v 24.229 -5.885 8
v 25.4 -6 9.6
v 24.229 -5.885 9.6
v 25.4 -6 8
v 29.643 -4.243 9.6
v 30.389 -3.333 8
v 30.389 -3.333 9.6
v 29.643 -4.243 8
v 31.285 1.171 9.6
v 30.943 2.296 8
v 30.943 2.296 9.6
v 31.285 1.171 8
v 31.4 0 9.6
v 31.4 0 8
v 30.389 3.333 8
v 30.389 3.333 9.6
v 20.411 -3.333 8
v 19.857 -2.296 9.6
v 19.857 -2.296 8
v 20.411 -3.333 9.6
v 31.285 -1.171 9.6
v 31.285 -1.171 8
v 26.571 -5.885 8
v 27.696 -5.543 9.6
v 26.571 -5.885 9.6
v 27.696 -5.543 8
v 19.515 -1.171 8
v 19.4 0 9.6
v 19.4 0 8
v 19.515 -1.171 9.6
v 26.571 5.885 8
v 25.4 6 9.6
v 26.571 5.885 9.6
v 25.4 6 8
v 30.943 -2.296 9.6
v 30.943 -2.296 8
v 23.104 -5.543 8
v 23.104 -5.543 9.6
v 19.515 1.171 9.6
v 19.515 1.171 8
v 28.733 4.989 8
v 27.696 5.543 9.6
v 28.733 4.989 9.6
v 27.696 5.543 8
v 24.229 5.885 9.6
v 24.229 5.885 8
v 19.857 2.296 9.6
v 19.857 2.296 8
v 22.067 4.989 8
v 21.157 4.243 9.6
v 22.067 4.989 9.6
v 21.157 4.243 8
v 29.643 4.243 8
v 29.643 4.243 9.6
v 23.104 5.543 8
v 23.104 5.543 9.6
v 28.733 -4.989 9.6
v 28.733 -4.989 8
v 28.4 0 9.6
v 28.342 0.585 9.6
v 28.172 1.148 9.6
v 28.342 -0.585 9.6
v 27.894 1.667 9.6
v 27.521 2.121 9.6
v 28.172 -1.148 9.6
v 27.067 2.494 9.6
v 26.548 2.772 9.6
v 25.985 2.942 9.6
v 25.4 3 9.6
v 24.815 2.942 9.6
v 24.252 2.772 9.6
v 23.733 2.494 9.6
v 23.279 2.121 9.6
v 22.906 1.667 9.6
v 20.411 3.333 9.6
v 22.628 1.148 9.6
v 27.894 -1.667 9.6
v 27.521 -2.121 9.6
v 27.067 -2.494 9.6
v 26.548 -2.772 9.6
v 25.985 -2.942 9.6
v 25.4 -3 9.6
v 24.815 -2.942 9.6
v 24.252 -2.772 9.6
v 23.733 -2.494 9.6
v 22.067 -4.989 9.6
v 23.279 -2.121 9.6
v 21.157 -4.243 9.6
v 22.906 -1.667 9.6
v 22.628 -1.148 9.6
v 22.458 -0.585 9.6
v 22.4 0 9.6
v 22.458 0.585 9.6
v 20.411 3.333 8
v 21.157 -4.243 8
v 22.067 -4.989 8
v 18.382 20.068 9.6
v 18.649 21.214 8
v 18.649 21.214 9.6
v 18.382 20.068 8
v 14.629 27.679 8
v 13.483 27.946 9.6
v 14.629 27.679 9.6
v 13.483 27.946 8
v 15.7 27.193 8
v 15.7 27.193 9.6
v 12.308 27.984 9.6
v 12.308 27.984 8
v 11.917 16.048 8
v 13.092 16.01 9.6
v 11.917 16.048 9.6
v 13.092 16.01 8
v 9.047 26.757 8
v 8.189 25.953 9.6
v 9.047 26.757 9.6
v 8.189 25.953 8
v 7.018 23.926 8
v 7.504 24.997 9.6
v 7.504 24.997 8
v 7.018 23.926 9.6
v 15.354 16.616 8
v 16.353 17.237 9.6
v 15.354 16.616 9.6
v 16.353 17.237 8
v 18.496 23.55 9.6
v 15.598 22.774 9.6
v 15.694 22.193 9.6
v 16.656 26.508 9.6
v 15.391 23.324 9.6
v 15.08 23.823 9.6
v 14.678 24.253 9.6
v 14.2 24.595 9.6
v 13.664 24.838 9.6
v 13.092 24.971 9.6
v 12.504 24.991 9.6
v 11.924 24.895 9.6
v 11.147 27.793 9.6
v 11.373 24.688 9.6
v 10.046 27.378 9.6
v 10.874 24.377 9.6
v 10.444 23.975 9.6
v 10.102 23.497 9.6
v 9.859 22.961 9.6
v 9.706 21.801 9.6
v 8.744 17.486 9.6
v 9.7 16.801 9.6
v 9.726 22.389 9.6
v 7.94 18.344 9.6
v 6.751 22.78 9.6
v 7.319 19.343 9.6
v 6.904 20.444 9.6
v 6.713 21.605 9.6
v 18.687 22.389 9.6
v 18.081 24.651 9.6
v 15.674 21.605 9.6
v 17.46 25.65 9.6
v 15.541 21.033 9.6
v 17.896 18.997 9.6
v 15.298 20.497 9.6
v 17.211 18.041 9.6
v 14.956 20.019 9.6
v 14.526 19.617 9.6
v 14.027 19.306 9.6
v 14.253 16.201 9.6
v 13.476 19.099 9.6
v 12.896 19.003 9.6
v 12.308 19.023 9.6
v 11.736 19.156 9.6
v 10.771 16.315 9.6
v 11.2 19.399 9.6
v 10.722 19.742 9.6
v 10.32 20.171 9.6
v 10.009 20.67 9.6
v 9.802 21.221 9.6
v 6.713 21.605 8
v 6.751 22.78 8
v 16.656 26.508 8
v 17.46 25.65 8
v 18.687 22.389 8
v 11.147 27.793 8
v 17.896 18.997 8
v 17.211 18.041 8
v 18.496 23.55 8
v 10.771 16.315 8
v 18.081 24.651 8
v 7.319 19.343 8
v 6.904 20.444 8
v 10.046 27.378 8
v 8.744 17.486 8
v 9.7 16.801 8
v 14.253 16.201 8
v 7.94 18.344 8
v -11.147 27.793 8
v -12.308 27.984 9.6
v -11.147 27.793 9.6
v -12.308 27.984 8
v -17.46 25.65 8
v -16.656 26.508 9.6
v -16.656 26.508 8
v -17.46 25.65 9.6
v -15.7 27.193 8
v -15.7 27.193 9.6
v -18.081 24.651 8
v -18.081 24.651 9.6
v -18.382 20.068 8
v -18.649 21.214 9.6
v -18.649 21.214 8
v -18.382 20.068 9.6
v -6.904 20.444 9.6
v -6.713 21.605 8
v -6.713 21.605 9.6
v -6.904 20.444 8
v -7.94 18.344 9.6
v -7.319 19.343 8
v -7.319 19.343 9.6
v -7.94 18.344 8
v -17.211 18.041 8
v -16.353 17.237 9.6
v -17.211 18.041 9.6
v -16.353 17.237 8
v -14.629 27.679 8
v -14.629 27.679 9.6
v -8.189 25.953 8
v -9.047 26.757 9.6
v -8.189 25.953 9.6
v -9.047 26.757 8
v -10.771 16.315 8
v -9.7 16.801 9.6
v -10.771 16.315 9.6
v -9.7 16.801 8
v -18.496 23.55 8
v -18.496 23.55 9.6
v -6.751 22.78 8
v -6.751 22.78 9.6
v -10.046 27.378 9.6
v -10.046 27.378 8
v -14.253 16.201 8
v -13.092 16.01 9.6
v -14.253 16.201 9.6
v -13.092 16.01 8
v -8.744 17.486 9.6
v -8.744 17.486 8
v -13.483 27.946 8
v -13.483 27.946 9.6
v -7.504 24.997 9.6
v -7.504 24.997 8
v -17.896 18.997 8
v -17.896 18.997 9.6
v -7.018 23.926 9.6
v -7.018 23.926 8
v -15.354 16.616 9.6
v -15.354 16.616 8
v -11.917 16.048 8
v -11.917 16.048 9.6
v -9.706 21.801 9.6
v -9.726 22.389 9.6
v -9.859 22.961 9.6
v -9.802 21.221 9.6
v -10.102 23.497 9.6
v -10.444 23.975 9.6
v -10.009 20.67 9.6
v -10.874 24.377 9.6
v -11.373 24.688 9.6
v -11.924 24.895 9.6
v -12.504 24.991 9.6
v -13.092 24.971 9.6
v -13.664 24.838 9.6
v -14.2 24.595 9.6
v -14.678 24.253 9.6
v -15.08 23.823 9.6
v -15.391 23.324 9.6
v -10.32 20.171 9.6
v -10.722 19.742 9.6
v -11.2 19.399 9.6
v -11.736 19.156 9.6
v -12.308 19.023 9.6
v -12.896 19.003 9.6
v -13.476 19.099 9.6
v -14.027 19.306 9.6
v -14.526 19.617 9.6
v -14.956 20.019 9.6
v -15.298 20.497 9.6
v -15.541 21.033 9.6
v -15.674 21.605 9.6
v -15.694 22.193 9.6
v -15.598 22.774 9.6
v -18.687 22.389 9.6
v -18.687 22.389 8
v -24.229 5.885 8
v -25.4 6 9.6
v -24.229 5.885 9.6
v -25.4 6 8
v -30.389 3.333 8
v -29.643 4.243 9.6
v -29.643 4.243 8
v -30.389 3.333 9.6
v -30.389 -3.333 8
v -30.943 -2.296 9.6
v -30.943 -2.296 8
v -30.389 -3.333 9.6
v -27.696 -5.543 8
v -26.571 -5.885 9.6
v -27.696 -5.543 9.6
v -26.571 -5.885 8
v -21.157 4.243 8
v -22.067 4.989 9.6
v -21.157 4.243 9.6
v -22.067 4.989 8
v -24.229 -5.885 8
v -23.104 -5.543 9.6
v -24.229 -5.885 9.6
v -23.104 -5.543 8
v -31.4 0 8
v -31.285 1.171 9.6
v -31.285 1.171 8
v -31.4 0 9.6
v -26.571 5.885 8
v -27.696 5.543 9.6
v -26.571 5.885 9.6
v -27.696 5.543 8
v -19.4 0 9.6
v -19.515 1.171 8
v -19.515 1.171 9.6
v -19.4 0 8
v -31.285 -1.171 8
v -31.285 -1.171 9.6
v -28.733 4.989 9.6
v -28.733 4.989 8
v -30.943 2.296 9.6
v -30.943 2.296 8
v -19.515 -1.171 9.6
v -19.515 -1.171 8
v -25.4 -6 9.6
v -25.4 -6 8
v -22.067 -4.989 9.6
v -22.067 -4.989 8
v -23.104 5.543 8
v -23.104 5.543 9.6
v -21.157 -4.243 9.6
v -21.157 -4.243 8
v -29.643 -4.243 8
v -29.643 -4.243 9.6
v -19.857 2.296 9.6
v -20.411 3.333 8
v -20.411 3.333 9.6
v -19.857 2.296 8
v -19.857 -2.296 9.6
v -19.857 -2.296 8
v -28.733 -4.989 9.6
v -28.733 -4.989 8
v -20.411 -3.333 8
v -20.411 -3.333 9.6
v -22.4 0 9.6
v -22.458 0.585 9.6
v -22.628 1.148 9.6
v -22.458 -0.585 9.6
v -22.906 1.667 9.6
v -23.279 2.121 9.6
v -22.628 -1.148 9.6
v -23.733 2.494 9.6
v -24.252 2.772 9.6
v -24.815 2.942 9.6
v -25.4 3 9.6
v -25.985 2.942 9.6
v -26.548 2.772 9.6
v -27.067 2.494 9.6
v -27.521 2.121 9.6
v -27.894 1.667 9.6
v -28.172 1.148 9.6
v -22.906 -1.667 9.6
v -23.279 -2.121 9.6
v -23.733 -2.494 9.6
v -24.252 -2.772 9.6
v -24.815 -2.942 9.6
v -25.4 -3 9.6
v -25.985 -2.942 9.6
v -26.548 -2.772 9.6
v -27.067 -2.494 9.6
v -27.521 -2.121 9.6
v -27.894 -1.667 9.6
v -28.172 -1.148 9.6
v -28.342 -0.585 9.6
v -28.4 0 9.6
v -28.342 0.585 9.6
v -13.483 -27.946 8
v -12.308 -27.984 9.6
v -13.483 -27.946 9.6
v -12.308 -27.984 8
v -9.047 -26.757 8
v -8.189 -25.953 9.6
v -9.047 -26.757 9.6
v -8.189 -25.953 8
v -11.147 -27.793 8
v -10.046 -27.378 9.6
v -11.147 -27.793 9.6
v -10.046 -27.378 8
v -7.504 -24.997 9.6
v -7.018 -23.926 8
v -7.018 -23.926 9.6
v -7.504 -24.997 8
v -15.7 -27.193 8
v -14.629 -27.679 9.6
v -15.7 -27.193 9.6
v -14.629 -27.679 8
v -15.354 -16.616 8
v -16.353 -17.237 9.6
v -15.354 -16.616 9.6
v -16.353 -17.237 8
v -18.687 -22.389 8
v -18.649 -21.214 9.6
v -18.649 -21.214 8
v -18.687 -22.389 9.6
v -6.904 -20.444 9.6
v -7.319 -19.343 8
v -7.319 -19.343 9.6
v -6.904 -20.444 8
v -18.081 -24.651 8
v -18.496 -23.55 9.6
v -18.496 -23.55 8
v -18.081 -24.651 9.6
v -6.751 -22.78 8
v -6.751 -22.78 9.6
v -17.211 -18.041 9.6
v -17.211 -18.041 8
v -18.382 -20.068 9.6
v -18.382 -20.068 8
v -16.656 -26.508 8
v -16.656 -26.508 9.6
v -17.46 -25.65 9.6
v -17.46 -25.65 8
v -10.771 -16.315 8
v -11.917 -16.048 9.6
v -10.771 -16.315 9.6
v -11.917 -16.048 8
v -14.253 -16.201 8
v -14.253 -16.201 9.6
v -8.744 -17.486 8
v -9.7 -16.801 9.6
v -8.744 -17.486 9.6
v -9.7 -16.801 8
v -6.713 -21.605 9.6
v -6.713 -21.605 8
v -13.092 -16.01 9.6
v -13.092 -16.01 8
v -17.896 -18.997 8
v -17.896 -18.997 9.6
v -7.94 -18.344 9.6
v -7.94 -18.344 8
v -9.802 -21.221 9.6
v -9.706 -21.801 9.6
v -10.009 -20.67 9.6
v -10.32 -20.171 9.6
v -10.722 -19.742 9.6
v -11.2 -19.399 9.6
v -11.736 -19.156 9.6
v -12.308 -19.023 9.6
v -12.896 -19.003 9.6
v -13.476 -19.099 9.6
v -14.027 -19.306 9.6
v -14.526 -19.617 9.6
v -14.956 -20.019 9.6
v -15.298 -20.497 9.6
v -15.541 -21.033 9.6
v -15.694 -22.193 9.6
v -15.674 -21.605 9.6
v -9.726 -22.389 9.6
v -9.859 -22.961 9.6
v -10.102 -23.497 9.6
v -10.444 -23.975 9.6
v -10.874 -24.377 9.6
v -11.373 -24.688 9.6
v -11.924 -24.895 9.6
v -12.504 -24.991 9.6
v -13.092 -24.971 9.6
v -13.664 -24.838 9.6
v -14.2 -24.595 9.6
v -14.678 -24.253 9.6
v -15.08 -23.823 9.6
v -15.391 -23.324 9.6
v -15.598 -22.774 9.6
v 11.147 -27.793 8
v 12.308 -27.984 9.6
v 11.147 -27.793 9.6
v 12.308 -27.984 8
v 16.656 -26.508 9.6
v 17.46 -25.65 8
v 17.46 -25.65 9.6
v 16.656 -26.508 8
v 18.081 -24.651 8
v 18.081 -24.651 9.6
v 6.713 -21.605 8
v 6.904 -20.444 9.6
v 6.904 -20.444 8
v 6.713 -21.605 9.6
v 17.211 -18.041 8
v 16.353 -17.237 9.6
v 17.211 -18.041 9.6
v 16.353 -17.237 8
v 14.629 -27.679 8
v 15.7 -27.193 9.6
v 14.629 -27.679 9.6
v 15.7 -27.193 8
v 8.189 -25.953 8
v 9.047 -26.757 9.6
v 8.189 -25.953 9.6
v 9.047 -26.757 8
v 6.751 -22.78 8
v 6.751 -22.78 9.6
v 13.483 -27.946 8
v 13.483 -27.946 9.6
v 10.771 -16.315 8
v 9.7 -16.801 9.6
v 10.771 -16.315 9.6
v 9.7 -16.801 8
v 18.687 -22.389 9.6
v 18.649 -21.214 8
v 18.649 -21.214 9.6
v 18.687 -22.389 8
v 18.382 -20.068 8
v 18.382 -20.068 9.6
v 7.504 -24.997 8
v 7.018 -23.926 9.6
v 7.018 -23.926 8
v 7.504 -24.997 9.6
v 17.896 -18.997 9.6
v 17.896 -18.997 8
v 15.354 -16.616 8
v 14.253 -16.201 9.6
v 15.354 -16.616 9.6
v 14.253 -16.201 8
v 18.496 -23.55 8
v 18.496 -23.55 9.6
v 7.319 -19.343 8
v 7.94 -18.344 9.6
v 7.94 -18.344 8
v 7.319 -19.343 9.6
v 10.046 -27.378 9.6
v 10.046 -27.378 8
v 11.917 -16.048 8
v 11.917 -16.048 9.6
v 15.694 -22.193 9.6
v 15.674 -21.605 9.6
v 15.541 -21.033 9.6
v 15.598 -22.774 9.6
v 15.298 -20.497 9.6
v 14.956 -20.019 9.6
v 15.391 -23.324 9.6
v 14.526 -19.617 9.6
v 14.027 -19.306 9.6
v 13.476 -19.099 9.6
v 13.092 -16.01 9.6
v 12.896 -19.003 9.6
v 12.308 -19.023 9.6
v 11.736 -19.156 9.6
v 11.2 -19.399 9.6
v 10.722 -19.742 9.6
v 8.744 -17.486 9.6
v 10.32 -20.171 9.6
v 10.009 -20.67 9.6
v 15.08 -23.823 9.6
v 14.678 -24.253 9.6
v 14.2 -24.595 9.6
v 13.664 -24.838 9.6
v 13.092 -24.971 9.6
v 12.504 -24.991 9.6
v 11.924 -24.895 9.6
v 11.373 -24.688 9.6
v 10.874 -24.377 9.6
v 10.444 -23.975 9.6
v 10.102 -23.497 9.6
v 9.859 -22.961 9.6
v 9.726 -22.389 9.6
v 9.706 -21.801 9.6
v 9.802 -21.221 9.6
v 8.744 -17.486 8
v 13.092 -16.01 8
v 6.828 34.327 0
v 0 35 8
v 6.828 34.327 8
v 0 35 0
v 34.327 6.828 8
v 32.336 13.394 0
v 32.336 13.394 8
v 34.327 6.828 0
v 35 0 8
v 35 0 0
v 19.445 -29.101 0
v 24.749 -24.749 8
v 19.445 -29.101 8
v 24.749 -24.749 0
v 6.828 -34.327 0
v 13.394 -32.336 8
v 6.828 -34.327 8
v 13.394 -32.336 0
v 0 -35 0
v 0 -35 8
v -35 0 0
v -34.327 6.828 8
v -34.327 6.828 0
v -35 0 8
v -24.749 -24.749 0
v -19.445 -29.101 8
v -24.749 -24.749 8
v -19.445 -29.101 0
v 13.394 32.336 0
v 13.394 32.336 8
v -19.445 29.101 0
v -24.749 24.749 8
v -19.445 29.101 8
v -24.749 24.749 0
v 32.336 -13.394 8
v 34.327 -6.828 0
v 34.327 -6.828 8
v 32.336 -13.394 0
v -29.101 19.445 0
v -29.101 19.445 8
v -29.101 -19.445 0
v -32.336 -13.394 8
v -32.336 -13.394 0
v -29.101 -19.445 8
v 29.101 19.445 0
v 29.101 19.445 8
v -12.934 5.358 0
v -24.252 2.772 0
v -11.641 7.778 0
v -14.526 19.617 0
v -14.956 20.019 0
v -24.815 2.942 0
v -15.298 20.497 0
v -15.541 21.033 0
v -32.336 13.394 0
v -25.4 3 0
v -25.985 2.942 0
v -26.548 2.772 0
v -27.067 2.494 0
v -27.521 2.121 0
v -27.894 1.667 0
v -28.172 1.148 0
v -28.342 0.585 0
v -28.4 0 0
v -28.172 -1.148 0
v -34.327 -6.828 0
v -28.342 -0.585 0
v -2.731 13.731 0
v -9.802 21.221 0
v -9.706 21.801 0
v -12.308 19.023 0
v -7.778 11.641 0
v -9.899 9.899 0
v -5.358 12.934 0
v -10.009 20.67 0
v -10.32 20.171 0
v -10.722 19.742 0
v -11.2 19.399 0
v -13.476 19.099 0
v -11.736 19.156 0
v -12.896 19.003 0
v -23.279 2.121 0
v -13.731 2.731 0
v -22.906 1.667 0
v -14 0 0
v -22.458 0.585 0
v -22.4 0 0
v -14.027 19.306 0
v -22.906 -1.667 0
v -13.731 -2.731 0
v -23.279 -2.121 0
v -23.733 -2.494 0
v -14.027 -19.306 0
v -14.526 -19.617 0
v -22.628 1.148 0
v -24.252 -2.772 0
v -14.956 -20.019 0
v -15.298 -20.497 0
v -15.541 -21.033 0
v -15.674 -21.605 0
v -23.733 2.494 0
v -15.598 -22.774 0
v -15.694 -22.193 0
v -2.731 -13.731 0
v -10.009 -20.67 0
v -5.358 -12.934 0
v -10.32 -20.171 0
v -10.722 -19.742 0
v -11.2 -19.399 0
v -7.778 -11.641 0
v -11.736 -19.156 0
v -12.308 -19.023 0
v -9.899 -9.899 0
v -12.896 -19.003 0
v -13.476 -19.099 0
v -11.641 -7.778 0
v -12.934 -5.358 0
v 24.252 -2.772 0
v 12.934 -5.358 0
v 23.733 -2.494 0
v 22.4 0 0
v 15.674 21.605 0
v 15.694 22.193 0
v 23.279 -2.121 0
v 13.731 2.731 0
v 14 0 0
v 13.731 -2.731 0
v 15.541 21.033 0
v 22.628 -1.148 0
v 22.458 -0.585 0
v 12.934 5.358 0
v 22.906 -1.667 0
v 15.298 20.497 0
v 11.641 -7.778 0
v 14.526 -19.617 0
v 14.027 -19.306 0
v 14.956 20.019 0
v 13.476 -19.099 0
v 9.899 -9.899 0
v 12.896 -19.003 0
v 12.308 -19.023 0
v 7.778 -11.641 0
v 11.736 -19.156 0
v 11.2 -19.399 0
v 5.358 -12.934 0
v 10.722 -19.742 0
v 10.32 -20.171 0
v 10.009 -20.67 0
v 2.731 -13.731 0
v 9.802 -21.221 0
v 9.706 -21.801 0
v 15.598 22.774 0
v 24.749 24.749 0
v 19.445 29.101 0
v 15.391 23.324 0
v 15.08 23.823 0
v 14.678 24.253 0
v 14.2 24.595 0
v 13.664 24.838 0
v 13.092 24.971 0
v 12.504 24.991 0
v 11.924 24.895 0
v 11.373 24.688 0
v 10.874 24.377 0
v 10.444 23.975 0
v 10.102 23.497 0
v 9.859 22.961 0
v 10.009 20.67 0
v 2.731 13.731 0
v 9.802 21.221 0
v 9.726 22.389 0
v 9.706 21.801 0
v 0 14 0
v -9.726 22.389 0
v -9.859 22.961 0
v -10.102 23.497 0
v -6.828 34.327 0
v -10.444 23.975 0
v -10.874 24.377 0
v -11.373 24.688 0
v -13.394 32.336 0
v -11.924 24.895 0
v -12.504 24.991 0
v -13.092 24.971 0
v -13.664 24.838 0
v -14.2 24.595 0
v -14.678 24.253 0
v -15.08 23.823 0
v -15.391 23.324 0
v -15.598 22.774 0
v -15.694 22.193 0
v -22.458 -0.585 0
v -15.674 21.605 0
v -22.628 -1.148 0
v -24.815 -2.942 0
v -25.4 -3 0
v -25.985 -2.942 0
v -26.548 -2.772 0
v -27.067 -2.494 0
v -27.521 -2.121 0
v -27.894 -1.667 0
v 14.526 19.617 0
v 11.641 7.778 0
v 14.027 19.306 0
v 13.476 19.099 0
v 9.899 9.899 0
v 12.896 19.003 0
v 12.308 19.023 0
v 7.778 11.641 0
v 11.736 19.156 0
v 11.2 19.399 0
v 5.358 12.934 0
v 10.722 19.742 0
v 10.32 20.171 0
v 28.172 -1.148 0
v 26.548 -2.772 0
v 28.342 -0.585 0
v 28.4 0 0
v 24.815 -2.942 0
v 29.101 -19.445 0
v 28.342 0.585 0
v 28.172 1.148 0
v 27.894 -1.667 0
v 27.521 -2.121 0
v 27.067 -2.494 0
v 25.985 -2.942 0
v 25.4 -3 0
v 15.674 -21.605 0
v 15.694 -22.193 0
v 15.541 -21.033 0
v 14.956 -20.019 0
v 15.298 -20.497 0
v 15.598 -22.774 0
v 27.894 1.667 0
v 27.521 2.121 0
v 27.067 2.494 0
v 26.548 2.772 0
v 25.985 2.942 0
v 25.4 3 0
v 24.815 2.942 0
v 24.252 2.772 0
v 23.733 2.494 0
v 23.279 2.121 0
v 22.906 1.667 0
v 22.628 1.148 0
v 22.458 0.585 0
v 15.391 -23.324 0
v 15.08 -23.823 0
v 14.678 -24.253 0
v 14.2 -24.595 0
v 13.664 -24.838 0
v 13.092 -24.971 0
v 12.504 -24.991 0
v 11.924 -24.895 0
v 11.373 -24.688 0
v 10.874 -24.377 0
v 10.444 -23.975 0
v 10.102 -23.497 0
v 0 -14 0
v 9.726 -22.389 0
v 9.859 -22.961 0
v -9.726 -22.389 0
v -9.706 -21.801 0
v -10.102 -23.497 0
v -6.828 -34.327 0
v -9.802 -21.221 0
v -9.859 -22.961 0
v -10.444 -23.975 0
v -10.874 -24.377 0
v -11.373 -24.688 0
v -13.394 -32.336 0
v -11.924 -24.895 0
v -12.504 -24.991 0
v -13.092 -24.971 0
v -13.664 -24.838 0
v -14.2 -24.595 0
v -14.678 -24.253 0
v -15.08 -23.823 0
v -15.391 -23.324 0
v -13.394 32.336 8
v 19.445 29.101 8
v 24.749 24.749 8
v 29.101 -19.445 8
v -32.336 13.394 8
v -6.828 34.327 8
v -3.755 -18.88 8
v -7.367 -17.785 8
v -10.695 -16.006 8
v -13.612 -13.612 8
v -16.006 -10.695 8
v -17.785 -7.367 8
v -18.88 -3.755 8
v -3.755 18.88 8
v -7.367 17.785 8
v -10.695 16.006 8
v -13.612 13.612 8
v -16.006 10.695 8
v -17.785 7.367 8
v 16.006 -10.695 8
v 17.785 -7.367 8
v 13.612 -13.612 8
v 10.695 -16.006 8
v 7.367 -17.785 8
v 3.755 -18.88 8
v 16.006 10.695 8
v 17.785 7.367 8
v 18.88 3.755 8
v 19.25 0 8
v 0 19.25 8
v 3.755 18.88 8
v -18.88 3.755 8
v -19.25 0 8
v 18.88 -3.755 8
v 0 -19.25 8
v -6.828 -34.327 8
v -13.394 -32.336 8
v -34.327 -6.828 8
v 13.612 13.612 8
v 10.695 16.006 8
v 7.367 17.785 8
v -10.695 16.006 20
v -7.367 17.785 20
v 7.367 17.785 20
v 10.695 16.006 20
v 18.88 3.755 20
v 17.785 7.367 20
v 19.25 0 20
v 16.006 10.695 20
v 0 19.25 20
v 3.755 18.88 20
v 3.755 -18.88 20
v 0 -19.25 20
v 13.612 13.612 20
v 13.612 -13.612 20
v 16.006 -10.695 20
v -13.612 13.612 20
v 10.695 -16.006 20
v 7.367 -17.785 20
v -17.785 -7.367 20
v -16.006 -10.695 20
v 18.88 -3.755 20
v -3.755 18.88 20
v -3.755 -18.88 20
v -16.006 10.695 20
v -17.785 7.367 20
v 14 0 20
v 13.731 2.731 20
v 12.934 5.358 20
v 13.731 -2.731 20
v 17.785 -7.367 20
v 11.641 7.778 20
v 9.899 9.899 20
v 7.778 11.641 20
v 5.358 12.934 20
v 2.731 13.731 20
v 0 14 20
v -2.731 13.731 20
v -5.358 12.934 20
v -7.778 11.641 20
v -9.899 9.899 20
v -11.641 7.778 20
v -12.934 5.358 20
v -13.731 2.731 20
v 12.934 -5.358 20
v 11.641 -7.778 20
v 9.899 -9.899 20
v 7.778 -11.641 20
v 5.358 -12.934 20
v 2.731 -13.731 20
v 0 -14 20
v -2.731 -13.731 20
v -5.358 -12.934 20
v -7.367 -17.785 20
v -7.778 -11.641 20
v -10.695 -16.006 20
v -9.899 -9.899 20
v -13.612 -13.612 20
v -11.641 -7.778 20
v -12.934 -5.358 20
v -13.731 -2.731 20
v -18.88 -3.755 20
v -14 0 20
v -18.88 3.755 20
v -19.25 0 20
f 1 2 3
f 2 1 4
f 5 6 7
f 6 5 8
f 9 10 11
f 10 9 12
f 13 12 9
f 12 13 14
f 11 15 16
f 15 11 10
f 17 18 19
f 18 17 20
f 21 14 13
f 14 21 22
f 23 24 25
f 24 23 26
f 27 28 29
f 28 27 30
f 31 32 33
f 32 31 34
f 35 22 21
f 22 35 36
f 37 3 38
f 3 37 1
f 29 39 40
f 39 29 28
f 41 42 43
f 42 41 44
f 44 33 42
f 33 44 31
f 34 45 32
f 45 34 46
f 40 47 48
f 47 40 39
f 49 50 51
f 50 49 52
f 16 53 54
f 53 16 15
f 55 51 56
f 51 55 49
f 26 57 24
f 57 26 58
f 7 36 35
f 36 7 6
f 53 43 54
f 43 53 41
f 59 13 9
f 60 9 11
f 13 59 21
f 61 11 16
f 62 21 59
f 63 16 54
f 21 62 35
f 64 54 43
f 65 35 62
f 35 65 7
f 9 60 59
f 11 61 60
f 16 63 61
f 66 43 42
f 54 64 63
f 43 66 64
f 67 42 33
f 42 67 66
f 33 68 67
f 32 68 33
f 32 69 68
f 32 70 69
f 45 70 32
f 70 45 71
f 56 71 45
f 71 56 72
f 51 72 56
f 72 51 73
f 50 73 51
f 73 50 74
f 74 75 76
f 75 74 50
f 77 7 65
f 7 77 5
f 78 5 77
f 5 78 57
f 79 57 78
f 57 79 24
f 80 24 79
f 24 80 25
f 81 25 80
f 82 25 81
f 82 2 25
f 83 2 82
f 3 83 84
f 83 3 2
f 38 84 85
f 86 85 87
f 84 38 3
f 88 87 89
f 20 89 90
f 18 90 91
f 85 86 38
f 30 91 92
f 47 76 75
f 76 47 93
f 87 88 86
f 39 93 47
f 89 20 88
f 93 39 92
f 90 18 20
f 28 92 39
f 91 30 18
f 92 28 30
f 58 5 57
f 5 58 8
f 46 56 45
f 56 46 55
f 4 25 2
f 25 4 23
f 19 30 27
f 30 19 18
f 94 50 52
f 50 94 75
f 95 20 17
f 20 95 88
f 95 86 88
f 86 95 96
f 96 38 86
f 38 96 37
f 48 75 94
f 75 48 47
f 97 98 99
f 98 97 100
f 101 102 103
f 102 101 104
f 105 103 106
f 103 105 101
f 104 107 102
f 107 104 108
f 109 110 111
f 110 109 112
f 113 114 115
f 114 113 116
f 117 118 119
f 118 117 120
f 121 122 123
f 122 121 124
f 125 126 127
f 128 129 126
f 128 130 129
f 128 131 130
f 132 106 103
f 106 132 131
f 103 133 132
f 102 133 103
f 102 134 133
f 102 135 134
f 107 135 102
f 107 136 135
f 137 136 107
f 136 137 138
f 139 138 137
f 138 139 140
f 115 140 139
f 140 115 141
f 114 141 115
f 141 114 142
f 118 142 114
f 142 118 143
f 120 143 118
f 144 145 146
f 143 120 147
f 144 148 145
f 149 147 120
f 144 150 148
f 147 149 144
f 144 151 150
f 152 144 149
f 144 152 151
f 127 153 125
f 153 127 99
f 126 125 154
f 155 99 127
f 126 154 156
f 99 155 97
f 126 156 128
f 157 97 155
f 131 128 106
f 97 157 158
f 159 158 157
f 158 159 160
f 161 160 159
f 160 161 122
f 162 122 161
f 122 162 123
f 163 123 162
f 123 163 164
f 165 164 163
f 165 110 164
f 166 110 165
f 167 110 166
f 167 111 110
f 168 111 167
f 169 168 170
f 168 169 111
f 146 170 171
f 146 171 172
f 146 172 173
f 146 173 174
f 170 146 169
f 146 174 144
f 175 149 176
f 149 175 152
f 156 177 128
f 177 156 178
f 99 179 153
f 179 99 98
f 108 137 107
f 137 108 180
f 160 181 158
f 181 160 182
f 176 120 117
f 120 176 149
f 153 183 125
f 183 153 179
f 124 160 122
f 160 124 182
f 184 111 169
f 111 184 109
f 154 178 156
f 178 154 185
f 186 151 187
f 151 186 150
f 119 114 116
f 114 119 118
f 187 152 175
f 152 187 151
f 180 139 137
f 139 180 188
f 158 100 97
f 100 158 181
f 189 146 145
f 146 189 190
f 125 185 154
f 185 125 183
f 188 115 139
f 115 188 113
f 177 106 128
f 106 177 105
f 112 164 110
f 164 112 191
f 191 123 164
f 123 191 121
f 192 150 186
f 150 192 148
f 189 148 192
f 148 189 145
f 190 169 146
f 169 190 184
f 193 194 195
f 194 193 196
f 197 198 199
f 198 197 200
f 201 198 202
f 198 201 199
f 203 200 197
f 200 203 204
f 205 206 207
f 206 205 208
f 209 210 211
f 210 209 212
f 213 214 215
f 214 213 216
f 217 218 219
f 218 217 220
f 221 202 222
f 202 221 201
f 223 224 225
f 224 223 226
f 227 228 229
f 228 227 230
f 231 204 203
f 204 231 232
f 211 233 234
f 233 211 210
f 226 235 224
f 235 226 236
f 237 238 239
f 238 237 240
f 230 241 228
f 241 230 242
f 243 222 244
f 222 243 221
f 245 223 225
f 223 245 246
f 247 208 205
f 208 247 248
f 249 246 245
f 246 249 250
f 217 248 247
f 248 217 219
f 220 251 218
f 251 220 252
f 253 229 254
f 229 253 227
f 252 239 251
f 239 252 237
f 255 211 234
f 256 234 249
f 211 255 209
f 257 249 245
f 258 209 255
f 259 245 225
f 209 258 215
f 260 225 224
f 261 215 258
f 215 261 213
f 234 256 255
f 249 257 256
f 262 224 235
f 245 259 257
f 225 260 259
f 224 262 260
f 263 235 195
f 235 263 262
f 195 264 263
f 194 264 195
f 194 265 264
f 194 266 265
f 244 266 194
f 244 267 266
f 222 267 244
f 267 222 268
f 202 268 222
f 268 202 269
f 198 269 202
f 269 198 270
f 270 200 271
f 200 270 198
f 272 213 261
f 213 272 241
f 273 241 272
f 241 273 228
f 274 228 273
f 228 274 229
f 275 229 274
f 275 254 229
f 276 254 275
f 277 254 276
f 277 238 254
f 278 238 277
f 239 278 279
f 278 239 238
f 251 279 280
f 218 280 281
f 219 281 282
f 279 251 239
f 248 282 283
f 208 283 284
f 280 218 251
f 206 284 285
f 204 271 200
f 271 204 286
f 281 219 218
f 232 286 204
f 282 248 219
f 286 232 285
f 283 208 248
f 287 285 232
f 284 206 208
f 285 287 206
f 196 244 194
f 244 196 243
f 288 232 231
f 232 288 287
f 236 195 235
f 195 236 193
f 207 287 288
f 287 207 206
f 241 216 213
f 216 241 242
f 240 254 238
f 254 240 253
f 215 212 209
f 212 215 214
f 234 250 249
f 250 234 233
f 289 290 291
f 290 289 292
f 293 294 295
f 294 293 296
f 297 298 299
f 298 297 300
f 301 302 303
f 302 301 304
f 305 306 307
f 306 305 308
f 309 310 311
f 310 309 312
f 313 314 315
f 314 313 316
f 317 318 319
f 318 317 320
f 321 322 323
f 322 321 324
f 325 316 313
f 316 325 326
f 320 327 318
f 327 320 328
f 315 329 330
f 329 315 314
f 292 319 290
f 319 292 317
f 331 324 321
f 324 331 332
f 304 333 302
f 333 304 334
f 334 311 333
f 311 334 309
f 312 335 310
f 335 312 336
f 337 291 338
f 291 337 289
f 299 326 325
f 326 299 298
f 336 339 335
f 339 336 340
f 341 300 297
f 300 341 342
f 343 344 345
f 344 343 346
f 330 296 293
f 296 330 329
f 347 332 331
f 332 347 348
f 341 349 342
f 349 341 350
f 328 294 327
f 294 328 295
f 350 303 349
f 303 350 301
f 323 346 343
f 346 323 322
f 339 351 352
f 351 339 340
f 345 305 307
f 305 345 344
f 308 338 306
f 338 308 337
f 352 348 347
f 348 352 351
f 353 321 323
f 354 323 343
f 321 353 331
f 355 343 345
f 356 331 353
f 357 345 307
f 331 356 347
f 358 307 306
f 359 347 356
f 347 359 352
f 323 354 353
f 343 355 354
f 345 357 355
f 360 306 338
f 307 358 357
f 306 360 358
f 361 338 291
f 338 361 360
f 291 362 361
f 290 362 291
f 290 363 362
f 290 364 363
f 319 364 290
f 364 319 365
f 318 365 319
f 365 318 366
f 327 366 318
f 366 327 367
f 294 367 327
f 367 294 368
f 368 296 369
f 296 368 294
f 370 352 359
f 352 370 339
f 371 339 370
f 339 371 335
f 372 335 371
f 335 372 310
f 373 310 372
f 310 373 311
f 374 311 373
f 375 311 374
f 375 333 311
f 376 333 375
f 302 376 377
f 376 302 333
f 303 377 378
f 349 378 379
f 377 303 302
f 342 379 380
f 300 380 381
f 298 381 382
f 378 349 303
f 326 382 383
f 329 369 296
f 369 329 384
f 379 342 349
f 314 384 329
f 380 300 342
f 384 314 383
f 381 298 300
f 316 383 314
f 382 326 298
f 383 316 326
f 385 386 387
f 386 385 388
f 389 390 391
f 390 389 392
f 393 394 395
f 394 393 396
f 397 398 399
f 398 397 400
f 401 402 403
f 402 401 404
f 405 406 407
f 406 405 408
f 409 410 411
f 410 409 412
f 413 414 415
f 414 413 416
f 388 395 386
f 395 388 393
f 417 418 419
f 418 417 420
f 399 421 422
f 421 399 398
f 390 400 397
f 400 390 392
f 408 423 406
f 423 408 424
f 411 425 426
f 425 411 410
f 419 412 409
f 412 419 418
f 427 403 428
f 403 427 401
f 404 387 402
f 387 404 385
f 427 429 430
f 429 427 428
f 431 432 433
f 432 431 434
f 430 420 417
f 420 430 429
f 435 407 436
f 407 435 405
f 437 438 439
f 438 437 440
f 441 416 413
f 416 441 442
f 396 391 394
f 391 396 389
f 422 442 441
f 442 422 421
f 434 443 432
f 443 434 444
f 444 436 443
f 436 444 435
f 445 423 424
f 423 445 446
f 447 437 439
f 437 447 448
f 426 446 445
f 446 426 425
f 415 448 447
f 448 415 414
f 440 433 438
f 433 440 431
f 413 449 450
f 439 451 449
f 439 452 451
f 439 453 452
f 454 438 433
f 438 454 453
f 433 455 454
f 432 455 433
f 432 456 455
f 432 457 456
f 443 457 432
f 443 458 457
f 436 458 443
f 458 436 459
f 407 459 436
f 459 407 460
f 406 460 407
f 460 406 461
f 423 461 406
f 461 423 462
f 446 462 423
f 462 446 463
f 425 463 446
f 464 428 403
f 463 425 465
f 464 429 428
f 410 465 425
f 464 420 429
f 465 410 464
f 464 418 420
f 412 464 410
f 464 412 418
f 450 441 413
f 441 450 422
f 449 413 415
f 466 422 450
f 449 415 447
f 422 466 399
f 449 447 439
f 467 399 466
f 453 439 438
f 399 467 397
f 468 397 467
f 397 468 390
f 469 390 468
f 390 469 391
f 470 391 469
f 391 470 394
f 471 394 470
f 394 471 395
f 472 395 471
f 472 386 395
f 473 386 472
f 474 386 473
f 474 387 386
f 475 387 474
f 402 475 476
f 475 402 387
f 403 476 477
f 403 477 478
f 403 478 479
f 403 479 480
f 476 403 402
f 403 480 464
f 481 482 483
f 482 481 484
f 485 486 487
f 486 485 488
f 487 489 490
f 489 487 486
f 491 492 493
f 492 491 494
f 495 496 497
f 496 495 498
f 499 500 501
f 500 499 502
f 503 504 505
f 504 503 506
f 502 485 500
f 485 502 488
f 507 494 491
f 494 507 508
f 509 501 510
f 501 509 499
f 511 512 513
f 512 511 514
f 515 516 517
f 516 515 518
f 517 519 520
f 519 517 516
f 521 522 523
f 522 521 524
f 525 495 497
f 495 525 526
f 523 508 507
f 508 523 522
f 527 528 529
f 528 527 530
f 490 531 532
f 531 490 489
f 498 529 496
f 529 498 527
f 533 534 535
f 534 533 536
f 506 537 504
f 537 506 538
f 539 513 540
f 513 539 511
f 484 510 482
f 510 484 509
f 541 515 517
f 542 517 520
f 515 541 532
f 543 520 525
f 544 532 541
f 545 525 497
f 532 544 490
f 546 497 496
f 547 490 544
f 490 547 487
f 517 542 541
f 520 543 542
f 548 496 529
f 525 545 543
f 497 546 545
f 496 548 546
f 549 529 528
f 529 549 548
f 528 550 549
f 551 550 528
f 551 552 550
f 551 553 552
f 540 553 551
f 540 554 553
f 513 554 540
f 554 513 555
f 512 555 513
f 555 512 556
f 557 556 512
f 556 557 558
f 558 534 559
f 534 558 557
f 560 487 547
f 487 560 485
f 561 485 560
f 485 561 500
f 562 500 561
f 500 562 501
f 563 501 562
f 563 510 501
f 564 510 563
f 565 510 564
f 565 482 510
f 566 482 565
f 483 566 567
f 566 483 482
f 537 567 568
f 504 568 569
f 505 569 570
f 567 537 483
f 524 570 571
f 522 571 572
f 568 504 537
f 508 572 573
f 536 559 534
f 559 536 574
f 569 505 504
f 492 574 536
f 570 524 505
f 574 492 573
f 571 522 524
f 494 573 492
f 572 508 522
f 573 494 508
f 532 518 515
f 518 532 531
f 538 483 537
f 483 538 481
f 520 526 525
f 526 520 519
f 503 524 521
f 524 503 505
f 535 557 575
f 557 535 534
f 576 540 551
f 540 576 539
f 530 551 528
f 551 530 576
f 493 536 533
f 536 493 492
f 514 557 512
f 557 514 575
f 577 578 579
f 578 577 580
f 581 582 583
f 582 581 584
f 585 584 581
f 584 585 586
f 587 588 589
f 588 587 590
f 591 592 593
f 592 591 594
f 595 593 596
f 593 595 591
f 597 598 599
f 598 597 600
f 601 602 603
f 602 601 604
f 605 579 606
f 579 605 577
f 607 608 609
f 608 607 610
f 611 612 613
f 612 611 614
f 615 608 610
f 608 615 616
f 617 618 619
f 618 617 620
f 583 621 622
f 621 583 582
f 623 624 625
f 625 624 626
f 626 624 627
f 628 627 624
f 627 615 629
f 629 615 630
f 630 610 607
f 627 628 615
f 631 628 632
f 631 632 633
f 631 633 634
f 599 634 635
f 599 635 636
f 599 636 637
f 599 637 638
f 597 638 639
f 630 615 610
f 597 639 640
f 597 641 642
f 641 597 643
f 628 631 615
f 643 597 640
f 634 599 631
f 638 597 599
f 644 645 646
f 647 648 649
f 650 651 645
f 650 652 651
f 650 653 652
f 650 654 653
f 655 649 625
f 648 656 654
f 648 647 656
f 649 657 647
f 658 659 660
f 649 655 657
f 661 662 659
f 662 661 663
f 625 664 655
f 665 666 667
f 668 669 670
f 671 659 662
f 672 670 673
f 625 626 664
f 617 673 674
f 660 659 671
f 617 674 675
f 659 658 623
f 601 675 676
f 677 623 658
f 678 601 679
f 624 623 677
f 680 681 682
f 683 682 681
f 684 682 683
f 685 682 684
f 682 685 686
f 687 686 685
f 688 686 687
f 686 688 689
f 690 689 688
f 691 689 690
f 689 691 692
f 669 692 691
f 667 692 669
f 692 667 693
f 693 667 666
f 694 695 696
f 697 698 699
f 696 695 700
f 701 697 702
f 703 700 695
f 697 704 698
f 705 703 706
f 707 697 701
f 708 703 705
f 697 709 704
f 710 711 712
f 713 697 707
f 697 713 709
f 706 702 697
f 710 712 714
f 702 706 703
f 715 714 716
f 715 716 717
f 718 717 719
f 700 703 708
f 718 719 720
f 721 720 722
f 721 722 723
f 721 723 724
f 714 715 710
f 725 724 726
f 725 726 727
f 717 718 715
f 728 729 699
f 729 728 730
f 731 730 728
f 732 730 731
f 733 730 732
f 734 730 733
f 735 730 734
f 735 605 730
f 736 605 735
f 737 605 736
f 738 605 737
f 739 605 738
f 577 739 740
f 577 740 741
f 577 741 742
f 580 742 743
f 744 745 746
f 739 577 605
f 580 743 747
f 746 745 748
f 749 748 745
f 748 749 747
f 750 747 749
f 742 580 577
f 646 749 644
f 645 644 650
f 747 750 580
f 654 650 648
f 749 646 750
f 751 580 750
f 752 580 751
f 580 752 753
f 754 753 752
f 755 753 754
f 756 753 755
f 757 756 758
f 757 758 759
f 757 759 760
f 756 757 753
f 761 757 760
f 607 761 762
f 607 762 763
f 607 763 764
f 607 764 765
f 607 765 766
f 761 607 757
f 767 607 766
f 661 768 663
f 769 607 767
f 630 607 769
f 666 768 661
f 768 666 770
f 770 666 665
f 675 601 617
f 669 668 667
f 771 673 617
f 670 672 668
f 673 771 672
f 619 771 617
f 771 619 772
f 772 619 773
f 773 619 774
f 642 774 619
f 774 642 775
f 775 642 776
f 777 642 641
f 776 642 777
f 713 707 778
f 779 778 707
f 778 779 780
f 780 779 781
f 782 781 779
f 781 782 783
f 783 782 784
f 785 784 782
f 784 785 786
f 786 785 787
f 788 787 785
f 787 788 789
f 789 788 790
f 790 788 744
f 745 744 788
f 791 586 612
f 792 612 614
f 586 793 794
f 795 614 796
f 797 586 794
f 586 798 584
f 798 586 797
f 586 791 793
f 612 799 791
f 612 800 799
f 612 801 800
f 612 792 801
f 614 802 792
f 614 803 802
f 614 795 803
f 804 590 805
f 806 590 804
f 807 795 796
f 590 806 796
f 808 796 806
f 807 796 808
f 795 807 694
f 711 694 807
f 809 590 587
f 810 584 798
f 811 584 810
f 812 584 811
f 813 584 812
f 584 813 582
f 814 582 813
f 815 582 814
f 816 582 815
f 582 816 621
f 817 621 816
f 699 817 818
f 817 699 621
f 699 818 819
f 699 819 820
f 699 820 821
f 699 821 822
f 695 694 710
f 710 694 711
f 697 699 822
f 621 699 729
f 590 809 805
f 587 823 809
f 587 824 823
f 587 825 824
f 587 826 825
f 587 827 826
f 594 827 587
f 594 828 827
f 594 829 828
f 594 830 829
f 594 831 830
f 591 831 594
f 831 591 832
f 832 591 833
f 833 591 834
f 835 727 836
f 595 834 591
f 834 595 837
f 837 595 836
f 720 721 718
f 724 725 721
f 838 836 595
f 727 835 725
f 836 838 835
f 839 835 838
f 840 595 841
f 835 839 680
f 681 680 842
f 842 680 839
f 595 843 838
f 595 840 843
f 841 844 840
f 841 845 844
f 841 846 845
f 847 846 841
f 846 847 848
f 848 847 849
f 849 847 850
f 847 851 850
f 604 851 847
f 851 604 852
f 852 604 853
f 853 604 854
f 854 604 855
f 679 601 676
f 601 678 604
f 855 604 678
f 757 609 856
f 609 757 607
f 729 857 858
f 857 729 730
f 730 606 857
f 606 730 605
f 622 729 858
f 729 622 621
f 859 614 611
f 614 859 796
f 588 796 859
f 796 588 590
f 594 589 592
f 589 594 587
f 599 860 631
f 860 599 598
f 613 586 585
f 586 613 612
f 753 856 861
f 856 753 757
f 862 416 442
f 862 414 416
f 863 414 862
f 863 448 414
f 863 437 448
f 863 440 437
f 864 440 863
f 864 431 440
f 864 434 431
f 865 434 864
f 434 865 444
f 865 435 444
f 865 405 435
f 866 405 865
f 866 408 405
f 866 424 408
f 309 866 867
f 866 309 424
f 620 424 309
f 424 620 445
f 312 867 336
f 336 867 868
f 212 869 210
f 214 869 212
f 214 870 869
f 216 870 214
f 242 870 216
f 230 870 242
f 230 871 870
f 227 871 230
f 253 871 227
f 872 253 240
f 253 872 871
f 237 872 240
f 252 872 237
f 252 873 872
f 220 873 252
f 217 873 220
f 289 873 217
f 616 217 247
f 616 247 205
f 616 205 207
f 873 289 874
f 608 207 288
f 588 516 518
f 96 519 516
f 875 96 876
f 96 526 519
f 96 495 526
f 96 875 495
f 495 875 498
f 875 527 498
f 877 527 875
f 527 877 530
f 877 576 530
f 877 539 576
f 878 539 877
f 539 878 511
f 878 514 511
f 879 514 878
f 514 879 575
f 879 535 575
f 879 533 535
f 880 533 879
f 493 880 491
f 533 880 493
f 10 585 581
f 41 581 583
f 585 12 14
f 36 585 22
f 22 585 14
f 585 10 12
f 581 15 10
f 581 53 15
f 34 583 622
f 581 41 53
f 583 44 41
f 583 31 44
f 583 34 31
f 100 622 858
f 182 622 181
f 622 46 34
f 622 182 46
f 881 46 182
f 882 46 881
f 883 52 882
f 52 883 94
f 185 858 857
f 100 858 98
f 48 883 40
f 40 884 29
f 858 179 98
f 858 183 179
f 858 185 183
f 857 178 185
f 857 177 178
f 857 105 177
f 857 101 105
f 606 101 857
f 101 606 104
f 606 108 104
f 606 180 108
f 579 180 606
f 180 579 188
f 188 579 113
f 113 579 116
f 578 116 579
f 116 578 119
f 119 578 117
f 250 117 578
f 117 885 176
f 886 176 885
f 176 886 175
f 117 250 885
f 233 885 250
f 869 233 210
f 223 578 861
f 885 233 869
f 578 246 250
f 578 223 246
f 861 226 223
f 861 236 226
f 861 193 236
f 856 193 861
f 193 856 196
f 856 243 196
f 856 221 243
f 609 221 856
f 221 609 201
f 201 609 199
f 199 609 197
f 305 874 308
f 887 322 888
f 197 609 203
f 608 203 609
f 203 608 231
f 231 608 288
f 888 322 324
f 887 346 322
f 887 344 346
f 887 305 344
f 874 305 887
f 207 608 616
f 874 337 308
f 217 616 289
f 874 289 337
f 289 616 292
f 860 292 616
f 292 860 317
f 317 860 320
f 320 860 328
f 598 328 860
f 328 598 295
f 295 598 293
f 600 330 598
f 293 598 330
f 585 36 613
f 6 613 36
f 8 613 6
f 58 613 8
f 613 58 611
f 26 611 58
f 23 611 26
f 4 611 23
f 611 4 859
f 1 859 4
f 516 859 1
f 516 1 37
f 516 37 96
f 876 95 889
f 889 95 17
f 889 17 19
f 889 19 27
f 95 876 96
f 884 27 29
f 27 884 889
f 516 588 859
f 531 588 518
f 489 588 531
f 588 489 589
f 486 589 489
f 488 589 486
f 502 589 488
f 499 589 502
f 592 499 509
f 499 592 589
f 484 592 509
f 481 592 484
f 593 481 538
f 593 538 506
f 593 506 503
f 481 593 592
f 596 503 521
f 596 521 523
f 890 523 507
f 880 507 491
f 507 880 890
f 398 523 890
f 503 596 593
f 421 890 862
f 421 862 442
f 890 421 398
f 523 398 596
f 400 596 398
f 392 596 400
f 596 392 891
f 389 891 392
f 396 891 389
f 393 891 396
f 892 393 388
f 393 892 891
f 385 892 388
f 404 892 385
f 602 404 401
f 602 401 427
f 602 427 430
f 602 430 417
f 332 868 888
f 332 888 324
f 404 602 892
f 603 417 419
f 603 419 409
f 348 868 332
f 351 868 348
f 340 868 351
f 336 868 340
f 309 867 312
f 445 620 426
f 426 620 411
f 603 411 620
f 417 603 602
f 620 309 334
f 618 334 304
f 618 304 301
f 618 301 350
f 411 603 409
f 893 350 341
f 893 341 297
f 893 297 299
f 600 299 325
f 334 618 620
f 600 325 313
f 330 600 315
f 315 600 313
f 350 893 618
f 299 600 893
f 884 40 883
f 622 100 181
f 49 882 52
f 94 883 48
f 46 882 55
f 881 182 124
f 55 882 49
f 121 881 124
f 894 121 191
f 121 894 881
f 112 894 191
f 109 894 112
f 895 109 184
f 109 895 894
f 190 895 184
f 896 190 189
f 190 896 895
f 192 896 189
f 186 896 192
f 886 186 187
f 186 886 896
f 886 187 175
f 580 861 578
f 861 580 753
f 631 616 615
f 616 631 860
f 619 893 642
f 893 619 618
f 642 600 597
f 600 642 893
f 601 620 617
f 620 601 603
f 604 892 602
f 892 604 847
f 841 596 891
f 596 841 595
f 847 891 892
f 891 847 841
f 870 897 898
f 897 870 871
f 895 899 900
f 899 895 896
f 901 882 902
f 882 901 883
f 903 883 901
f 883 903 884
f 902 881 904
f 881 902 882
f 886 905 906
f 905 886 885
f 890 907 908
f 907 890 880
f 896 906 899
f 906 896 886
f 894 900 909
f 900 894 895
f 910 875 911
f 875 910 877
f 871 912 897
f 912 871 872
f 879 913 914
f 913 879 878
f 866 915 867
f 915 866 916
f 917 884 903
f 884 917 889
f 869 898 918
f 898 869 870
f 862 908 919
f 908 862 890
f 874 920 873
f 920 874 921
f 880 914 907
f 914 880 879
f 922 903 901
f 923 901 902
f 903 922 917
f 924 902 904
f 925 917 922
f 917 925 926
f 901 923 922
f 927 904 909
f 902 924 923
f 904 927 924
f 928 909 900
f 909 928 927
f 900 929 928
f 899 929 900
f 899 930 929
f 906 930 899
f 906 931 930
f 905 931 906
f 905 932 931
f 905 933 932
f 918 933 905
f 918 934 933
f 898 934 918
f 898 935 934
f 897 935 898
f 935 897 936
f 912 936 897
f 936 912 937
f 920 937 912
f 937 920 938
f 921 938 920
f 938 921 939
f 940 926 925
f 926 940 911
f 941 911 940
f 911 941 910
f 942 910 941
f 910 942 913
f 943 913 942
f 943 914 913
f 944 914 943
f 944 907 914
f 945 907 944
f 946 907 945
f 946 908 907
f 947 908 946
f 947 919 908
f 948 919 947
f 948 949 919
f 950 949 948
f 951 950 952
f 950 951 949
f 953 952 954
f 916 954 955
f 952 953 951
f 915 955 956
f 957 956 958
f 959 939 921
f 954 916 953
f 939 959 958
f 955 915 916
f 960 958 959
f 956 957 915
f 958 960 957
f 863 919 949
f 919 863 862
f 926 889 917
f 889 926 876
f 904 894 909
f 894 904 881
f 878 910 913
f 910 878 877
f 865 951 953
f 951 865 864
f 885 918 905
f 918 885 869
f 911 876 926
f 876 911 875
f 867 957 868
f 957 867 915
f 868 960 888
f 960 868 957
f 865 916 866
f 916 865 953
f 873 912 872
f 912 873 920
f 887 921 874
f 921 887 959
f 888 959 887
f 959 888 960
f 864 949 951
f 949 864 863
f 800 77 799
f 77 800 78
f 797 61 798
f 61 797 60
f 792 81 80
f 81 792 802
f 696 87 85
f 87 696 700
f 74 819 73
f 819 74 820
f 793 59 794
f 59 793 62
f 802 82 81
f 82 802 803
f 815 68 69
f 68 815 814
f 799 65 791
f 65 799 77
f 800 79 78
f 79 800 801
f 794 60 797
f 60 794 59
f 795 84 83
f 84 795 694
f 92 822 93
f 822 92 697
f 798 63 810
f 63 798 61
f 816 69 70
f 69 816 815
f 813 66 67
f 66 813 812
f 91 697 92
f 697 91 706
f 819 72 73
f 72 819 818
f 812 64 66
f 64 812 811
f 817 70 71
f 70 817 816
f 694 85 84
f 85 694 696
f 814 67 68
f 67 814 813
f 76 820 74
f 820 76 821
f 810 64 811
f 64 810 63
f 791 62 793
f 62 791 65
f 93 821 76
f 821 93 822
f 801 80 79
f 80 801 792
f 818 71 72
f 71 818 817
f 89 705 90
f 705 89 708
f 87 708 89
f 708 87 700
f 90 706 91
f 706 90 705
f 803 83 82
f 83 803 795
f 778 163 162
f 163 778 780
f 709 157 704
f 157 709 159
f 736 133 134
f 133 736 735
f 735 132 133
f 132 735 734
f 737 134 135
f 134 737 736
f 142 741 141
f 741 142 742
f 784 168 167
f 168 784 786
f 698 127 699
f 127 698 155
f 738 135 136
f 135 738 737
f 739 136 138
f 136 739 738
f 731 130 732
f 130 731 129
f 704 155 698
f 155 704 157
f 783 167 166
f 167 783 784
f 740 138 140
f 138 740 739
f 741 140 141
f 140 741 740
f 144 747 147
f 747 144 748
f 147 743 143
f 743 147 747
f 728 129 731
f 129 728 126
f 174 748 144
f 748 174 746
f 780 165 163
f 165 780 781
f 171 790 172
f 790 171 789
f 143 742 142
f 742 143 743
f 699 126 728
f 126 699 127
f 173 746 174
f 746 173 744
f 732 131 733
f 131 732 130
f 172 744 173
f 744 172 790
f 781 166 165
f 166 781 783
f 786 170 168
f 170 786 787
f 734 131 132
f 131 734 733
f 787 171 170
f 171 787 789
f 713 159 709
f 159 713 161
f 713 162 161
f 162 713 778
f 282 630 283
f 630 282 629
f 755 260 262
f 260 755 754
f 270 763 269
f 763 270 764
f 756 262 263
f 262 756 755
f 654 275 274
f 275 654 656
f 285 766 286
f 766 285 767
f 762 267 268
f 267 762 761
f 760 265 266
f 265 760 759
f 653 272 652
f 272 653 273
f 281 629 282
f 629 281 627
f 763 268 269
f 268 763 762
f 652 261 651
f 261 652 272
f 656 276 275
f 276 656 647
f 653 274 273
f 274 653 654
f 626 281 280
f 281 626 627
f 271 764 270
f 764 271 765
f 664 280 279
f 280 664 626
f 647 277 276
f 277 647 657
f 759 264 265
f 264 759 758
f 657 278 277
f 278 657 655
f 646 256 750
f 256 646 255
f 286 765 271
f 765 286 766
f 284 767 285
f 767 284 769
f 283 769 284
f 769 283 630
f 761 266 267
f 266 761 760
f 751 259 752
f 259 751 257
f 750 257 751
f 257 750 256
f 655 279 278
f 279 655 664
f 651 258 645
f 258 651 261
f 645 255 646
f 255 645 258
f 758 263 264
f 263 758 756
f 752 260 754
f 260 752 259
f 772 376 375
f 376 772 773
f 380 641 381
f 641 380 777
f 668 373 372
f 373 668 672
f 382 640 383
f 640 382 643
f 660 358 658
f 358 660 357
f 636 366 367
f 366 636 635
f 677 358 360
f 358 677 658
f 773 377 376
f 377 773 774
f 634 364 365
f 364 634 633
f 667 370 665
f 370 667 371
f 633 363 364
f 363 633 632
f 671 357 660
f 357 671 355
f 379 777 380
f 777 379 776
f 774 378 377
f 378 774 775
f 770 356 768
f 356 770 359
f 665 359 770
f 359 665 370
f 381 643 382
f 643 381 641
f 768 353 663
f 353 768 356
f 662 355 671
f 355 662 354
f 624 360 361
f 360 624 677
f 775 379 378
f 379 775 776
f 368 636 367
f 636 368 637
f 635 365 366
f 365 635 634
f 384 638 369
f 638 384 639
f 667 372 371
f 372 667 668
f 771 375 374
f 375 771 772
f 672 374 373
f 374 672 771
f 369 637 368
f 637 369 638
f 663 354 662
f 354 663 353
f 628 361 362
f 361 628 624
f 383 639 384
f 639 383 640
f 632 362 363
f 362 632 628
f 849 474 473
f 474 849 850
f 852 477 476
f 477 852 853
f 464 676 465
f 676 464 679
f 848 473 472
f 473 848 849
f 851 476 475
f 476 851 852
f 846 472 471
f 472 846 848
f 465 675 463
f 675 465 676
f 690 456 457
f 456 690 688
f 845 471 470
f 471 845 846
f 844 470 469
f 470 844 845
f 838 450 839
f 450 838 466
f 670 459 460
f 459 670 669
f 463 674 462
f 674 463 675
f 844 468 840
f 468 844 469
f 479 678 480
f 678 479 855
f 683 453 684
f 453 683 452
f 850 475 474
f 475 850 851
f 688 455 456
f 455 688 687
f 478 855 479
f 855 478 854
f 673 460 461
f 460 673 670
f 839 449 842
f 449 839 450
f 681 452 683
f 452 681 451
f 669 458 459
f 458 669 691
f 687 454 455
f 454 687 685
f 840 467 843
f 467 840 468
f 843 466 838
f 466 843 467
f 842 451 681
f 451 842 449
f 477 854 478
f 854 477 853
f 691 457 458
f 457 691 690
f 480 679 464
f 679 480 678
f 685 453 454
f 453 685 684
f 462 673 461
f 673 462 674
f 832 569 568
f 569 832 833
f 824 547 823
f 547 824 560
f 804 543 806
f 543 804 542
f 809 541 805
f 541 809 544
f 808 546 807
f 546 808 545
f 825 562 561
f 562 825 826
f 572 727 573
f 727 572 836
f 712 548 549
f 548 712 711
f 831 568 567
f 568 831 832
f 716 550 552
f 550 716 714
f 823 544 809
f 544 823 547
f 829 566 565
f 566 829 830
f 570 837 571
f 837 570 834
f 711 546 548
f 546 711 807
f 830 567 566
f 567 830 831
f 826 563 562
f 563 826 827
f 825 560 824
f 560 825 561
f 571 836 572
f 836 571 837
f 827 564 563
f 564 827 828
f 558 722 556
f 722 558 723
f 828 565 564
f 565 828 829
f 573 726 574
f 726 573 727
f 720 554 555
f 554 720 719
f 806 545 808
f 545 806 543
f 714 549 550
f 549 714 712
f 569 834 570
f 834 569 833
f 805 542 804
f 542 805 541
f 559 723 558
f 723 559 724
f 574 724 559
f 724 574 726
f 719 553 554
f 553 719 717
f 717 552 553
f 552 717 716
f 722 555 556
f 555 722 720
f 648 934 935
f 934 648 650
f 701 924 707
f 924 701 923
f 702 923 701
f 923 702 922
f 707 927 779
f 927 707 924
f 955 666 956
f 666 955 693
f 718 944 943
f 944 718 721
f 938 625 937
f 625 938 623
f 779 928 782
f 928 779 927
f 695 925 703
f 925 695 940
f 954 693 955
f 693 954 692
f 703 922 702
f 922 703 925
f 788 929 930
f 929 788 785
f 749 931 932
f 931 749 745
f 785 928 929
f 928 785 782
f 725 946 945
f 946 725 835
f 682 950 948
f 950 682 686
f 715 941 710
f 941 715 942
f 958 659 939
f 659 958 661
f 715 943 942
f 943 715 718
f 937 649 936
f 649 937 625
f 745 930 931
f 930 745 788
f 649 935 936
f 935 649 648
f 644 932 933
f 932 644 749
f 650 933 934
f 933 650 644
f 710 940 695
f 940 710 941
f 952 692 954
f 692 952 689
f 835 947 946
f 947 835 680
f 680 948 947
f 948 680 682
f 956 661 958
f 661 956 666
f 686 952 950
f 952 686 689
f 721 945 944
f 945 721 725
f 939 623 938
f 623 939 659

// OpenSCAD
$fn = 32;

// ----------------------------------------------------------------------
// Bolt-circle flange: 70 mm outside, 6 bolt holes, bore 28 mm
// ----------------------------------------------------------------------

// --- parameters (mm) ---
flange_d = 70;            // flange outside diameter
flange_t = 8;             // flange thickness
bolts = 6;                // number of bolt holes
bolt_d = 6;               // bolt clearance
bolt_r = 25.4;            // bolt circle radius
bore_d = 28;              // centre bore
hub_d = 38.5;             // raised hub diameter
hub_h = 12;               // raised hub height
spot_d = 12;              // spot faced bosses
spot_h = 1.6;             // spot face height

module body() {
  cylinder(h = flange_t, d = flange_d);
  /* raised hub, sunk 1 mm into the flange */
  translate([0, 0, flange_t - 1]) cylinder(h = hub_h + 1, d = hub_d);
  /* spot faced pads under the bolt heads */
  for (i = [0 : bolts - 1]) rotate([0, 0, i * 360 / bolts]) translate([bolt_r, 0, flange_t - 1]) cylinder(h = spot_h + 1, d = spot_d);
}

difference() {
  body();
  /* bolt circle */
  for (i = [0 : bolts - 1]) rotate([0, 0, i * 360 / bolts]) translate([bolt_r, 0, -1]) cylinder(h = flange_t + hub_h + 3, d = bolt_d);
  translate([0, 0, -1]) cylinder(h = flange_t + hub_h + 3, d = bore_d);
}
